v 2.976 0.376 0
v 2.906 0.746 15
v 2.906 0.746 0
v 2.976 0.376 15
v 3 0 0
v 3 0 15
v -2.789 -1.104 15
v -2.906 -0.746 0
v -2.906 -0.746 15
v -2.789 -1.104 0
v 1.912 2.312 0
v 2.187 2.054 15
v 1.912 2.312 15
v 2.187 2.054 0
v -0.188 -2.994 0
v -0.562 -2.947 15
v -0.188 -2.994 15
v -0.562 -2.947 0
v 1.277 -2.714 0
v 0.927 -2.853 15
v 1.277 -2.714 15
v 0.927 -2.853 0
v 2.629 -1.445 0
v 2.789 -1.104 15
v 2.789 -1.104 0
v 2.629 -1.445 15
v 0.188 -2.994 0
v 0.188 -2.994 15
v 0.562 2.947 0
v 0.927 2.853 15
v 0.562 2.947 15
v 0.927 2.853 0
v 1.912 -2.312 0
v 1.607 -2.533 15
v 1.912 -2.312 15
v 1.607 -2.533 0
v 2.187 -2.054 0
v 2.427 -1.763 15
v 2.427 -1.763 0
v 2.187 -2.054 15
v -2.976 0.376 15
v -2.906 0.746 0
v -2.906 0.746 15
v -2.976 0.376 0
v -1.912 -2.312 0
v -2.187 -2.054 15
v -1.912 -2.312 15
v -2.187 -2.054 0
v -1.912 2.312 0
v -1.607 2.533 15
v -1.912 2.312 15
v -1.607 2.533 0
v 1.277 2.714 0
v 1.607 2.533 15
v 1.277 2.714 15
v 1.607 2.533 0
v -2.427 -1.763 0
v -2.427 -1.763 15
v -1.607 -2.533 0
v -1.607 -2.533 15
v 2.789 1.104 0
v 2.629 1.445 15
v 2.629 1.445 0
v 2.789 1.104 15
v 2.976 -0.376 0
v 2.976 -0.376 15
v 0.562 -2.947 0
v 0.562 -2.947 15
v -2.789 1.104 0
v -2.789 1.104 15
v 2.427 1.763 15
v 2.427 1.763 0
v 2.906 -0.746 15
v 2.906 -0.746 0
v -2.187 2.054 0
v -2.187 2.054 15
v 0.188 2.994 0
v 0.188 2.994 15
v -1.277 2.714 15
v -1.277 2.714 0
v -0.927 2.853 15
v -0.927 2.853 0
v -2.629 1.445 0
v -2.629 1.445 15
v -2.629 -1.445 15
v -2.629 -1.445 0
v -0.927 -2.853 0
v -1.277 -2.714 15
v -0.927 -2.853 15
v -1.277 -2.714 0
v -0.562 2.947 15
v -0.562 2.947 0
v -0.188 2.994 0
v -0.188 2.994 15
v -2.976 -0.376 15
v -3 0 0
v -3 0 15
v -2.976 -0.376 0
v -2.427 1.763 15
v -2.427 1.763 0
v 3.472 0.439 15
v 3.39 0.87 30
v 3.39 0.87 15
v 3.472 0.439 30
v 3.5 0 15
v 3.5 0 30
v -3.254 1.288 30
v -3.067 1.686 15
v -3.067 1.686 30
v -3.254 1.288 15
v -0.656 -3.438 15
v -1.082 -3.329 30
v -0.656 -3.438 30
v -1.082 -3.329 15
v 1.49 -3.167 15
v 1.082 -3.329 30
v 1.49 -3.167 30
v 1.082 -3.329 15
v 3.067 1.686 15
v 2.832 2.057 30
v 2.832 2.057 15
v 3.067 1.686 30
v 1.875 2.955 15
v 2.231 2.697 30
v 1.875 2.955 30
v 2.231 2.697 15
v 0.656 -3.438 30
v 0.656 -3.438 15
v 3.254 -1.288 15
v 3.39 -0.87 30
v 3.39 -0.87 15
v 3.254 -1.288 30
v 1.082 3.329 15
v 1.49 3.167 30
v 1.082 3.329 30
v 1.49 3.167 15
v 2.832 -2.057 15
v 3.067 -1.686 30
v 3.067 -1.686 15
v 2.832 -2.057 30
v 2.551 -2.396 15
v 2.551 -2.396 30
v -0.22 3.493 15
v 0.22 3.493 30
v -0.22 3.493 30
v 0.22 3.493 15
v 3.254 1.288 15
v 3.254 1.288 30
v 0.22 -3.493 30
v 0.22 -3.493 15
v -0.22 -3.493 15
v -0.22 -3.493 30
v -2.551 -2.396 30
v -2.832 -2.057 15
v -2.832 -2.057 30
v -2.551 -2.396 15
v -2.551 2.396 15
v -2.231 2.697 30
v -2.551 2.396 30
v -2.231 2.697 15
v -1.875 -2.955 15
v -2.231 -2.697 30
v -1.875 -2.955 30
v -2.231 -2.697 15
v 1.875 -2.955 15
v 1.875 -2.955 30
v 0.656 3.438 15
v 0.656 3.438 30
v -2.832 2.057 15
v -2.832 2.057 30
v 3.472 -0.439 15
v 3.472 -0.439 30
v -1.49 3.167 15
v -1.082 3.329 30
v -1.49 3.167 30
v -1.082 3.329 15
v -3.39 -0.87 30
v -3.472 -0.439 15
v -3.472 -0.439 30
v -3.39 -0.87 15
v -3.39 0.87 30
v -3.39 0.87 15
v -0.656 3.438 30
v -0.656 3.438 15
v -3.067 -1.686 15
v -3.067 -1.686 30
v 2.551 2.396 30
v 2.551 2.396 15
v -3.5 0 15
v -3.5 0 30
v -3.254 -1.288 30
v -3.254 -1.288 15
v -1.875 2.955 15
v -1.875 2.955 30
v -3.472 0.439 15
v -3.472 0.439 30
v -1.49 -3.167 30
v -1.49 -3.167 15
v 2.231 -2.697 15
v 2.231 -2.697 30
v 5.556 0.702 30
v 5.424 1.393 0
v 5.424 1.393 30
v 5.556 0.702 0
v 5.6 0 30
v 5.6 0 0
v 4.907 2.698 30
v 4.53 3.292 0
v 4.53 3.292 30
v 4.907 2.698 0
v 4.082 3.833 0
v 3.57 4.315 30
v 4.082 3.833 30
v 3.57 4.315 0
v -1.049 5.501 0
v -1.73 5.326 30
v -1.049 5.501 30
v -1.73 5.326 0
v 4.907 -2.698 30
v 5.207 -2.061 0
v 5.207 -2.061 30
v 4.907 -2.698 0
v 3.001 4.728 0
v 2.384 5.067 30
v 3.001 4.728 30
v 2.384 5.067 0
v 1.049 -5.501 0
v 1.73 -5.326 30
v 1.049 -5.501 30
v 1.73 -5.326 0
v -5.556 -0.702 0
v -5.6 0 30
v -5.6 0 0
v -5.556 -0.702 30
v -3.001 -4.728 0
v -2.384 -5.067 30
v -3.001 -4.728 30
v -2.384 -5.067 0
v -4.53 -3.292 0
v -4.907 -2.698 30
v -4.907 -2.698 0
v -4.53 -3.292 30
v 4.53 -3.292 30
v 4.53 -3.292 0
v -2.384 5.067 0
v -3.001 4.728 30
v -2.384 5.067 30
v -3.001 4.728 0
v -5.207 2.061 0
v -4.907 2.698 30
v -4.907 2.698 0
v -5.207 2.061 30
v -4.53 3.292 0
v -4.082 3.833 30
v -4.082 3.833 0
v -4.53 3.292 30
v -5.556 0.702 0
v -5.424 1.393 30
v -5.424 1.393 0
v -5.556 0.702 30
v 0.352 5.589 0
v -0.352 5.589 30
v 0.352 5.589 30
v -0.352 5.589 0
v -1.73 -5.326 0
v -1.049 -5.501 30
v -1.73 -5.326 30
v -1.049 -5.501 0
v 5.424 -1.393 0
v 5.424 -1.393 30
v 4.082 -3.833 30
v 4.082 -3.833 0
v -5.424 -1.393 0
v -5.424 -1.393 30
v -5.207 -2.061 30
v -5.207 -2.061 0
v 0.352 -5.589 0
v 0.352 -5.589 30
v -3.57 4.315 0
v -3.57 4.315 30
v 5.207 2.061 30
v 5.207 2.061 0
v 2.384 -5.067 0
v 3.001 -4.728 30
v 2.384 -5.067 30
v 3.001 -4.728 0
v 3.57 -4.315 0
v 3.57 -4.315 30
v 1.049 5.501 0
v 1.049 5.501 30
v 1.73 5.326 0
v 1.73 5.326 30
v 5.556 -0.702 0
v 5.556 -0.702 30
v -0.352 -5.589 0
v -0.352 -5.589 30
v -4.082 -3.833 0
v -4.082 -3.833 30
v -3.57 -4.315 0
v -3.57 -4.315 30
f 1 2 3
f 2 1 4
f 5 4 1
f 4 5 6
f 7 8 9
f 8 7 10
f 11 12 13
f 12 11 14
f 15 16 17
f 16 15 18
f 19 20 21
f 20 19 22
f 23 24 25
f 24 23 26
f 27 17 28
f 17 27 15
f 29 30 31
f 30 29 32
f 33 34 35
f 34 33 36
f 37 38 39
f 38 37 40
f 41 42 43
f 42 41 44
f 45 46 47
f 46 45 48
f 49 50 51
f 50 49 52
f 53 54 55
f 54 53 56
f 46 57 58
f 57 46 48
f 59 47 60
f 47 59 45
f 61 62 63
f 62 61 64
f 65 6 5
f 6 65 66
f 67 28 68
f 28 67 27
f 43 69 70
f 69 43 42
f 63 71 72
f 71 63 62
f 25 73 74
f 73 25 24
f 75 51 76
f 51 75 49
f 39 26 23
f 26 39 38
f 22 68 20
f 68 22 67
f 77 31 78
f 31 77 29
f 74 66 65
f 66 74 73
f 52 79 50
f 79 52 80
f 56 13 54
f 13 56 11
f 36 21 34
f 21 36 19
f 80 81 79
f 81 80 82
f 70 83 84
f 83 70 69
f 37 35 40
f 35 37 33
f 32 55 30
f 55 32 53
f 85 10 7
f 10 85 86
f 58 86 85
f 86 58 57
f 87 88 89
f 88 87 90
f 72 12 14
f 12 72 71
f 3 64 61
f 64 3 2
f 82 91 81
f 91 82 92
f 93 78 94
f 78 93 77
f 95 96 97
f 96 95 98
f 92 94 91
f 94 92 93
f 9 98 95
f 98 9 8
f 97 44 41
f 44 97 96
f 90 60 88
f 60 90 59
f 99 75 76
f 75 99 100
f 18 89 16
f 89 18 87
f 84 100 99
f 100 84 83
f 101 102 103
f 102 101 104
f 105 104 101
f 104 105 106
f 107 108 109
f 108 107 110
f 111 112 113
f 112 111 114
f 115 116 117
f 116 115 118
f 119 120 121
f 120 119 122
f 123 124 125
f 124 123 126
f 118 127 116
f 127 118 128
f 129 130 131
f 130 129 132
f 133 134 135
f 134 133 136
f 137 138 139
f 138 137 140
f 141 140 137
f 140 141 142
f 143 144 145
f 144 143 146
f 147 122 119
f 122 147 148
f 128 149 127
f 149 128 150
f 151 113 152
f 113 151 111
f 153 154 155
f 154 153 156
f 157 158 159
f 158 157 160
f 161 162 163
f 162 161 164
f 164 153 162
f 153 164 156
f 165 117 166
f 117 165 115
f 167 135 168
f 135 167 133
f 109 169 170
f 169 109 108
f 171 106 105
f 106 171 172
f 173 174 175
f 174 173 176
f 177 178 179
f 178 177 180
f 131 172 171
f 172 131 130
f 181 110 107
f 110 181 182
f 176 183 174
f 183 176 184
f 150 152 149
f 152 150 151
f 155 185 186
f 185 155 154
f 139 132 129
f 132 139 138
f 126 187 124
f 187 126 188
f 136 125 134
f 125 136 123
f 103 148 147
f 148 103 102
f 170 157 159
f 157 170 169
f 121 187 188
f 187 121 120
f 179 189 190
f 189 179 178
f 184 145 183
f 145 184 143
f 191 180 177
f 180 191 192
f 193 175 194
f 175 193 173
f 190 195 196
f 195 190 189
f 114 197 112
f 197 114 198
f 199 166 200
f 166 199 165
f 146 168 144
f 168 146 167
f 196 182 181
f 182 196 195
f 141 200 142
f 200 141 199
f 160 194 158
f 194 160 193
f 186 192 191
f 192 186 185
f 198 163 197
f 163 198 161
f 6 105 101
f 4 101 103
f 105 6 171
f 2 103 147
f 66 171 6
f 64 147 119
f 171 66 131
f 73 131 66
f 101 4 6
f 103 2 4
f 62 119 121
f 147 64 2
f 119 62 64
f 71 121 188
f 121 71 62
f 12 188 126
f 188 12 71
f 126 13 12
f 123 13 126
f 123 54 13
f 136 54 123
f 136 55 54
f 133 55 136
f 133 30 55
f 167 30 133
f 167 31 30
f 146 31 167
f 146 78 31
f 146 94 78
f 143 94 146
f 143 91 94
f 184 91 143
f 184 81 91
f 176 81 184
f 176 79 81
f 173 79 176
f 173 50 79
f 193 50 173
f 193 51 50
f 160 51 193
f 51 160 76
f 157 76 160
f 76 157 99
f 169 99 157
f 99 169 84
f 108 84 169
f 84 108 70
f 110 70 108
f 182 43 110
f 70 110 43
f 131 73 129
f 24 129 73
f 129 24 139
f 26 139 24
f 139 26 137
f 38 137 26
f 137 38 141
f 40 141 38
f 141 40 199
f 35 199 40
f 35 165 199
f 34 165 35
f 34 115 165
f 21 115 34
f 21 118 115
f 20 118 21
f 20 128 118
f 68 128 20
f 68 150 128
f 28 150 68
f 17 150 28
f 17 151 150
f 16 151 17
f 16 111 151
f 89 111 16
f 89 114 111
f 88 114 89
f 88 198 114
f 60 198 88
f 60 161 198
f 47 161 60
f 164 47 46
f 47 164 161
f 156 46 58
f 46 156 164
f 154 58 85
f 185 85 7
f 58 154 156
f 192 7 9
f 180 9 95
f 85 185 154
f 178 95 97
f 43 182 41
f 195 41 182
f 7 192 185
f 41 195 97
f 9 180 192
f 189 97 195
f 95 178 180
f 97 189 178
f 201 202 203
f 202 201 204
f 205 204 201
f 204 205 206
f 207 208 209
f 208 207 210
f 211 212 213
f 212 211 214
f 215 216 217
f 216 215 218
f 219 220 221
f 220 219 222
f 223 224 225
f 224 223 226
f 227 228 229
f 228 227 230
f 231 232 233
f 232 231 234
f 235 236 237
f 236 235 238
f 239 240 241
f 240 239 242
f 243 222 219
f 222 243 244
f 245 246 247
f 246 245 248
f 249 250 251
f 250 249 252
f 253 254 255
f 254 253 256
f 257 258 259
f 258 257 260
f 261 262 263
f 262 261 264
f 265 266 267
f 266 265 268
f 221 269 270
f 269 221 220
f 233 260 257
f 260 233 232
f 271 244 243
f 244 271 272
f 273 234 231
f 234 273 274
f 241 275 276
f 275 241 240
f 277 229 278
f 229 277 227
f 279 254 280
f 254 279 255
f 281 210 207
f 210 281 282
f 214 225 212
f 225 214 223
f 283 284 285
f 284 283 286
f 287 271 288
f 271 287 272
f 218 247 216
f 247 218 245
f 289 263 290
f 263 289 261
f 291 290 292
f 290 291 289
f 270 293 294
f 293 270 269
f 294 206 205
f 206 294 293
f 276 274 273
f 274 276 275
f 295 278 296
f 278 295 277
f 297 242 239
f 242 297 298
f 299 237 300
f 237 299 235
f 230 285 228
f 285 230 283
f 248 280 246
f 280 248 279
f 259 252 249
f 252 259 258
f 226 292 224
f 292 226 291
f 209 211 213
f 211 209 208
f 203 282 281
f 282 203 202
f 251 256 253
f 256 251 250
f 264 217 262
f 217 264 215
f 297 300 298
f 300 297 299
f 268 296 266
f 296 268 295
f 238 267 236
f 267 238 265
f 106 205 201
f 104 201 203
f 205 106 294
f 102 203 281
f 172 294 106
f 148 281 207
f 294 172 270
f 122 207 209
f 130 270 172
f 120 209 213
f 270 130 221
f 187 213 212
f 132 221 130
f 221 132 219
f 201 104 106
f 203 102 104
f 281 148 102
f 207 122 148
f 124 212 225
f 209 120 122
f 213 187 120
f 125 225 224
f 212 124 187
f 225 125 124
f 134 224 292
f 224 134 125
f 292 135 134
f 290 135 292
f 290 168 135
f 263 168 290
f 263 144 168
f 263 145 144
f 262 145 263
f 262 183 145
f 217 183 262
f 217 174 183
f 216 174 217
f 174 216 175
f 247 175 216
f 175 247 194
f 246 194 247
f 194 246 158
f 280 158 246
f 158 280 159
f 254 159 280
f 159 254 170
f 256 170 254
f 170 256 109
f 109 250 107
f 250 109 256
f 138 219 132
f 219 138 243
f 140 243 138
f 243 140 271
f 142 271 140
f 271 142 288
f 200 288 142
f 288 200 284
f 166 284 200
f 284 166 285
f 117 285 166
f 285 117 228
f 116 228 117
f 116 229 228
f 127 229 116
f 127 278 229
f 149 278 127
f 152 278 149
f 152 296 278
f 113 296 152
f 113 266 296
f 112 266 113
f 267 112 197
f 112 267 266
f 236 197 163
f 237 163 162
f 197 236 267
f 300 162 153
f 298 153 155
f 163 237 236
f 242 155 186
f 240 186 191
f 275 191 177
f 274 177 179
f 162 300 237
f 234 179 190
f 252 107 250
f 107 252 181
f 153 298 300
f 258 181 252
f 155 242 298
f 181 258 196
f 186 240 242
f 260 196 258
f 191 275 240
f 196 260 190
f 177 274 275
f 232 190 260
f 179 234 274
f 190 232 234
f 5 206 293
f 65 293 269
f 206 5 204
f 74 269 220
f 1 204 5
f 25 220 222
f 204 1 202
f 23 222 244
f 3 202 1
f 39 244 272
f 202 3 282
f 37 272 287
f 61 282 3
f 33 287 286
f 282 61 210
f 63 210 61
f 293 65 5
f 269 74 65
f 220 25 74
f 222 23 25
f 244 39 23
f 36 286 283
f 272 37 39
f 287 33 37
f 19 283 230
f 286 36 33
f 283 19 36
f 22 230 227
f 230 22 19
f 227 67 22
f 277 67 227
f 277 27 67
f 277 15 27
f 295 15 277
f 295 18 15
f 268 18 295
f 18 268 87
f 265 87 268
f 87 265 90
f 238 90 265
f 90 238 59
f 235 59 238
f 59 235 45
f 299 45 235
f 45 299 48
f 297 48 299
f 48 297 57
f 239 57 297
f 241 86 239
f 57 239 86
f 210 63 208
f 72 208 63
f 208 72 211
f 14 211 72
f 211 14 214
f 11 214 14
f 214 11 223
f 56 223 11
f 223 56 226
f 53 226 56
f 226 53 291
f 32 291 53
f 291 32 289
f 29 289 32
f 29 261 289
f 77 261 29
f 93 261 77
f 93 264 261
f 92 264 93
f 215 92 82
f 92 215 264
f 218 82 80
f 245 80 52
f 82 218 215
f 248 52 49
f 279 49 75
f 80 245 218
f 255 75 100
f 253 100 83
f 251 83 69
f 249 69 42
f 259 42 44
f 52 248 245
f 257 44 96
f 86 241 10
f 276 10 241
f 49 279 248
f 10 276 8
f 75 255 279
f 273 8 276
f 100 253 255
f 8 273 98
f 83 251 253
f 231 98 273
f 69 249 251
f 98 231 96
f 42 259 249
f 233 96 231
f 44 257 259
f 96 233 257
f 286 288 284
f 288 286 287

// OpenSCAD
//Rod_connector V4 for Rostock / Kossel Printers. 
// (c) g3org

// What type of object should be generated?
generate = "Round"; // [Round,Square]

//mm
Rod_diameter_outside=6; //

//mm 
Jaws_diameter_outside=7; //

// object height mm
height=30; 

// Wall_thickness
Wall_thickness=2;


/* [Hidden] */
$fn=50;

//inputs end

// cylinder object


module cylinder_full(){
	if (Rod_diameter_outside <= Jaws_diameter_outside){
					cylinder(h=height,r=Jaws_diameter_outside/2+Wall_thickness+0.1);
				}
				else{
					cylinder(h=height,r=Jaws_diameter_outside/2+Wall_thickness+0.1);
				}
}

module cylinder_final(){

		difference(){
			cylinder_full();
			inlay();
		}

}








//cube object
module cube_full(){
	difference(){
		linear_extrude(height = height){
			minkowski(){
				if (Rod_diameter_outside <= Jaws_diameter_outside){
				   square(Jaws_diameter_outside+Wall_thickness-2,center=true);
				}
				else{
					square(Rod_diameter_outside+Wall_thickness-2,center=true);
				}
				circle(1);
				}
		}
	}

}
module inlay(){

		translate([0,0,-1]){
				cylinder (h=height/2+2,r=Rod_diameter_outside/2);
				}
		translate([0,0,height/2]){
				cylinder (h=height/2+1,r=Jaws_diameter_outside/2);
		}
}


module cube_Final(){
	difference(){
		cube_full();
		inlay();
	}

}


////////////////////////////////////////////////////////////////////////////////
// Main


if (generate=="Round") {
	cylinder_final();
		
	
}
else if (generate=="Square"){
	cube_Final();
}
